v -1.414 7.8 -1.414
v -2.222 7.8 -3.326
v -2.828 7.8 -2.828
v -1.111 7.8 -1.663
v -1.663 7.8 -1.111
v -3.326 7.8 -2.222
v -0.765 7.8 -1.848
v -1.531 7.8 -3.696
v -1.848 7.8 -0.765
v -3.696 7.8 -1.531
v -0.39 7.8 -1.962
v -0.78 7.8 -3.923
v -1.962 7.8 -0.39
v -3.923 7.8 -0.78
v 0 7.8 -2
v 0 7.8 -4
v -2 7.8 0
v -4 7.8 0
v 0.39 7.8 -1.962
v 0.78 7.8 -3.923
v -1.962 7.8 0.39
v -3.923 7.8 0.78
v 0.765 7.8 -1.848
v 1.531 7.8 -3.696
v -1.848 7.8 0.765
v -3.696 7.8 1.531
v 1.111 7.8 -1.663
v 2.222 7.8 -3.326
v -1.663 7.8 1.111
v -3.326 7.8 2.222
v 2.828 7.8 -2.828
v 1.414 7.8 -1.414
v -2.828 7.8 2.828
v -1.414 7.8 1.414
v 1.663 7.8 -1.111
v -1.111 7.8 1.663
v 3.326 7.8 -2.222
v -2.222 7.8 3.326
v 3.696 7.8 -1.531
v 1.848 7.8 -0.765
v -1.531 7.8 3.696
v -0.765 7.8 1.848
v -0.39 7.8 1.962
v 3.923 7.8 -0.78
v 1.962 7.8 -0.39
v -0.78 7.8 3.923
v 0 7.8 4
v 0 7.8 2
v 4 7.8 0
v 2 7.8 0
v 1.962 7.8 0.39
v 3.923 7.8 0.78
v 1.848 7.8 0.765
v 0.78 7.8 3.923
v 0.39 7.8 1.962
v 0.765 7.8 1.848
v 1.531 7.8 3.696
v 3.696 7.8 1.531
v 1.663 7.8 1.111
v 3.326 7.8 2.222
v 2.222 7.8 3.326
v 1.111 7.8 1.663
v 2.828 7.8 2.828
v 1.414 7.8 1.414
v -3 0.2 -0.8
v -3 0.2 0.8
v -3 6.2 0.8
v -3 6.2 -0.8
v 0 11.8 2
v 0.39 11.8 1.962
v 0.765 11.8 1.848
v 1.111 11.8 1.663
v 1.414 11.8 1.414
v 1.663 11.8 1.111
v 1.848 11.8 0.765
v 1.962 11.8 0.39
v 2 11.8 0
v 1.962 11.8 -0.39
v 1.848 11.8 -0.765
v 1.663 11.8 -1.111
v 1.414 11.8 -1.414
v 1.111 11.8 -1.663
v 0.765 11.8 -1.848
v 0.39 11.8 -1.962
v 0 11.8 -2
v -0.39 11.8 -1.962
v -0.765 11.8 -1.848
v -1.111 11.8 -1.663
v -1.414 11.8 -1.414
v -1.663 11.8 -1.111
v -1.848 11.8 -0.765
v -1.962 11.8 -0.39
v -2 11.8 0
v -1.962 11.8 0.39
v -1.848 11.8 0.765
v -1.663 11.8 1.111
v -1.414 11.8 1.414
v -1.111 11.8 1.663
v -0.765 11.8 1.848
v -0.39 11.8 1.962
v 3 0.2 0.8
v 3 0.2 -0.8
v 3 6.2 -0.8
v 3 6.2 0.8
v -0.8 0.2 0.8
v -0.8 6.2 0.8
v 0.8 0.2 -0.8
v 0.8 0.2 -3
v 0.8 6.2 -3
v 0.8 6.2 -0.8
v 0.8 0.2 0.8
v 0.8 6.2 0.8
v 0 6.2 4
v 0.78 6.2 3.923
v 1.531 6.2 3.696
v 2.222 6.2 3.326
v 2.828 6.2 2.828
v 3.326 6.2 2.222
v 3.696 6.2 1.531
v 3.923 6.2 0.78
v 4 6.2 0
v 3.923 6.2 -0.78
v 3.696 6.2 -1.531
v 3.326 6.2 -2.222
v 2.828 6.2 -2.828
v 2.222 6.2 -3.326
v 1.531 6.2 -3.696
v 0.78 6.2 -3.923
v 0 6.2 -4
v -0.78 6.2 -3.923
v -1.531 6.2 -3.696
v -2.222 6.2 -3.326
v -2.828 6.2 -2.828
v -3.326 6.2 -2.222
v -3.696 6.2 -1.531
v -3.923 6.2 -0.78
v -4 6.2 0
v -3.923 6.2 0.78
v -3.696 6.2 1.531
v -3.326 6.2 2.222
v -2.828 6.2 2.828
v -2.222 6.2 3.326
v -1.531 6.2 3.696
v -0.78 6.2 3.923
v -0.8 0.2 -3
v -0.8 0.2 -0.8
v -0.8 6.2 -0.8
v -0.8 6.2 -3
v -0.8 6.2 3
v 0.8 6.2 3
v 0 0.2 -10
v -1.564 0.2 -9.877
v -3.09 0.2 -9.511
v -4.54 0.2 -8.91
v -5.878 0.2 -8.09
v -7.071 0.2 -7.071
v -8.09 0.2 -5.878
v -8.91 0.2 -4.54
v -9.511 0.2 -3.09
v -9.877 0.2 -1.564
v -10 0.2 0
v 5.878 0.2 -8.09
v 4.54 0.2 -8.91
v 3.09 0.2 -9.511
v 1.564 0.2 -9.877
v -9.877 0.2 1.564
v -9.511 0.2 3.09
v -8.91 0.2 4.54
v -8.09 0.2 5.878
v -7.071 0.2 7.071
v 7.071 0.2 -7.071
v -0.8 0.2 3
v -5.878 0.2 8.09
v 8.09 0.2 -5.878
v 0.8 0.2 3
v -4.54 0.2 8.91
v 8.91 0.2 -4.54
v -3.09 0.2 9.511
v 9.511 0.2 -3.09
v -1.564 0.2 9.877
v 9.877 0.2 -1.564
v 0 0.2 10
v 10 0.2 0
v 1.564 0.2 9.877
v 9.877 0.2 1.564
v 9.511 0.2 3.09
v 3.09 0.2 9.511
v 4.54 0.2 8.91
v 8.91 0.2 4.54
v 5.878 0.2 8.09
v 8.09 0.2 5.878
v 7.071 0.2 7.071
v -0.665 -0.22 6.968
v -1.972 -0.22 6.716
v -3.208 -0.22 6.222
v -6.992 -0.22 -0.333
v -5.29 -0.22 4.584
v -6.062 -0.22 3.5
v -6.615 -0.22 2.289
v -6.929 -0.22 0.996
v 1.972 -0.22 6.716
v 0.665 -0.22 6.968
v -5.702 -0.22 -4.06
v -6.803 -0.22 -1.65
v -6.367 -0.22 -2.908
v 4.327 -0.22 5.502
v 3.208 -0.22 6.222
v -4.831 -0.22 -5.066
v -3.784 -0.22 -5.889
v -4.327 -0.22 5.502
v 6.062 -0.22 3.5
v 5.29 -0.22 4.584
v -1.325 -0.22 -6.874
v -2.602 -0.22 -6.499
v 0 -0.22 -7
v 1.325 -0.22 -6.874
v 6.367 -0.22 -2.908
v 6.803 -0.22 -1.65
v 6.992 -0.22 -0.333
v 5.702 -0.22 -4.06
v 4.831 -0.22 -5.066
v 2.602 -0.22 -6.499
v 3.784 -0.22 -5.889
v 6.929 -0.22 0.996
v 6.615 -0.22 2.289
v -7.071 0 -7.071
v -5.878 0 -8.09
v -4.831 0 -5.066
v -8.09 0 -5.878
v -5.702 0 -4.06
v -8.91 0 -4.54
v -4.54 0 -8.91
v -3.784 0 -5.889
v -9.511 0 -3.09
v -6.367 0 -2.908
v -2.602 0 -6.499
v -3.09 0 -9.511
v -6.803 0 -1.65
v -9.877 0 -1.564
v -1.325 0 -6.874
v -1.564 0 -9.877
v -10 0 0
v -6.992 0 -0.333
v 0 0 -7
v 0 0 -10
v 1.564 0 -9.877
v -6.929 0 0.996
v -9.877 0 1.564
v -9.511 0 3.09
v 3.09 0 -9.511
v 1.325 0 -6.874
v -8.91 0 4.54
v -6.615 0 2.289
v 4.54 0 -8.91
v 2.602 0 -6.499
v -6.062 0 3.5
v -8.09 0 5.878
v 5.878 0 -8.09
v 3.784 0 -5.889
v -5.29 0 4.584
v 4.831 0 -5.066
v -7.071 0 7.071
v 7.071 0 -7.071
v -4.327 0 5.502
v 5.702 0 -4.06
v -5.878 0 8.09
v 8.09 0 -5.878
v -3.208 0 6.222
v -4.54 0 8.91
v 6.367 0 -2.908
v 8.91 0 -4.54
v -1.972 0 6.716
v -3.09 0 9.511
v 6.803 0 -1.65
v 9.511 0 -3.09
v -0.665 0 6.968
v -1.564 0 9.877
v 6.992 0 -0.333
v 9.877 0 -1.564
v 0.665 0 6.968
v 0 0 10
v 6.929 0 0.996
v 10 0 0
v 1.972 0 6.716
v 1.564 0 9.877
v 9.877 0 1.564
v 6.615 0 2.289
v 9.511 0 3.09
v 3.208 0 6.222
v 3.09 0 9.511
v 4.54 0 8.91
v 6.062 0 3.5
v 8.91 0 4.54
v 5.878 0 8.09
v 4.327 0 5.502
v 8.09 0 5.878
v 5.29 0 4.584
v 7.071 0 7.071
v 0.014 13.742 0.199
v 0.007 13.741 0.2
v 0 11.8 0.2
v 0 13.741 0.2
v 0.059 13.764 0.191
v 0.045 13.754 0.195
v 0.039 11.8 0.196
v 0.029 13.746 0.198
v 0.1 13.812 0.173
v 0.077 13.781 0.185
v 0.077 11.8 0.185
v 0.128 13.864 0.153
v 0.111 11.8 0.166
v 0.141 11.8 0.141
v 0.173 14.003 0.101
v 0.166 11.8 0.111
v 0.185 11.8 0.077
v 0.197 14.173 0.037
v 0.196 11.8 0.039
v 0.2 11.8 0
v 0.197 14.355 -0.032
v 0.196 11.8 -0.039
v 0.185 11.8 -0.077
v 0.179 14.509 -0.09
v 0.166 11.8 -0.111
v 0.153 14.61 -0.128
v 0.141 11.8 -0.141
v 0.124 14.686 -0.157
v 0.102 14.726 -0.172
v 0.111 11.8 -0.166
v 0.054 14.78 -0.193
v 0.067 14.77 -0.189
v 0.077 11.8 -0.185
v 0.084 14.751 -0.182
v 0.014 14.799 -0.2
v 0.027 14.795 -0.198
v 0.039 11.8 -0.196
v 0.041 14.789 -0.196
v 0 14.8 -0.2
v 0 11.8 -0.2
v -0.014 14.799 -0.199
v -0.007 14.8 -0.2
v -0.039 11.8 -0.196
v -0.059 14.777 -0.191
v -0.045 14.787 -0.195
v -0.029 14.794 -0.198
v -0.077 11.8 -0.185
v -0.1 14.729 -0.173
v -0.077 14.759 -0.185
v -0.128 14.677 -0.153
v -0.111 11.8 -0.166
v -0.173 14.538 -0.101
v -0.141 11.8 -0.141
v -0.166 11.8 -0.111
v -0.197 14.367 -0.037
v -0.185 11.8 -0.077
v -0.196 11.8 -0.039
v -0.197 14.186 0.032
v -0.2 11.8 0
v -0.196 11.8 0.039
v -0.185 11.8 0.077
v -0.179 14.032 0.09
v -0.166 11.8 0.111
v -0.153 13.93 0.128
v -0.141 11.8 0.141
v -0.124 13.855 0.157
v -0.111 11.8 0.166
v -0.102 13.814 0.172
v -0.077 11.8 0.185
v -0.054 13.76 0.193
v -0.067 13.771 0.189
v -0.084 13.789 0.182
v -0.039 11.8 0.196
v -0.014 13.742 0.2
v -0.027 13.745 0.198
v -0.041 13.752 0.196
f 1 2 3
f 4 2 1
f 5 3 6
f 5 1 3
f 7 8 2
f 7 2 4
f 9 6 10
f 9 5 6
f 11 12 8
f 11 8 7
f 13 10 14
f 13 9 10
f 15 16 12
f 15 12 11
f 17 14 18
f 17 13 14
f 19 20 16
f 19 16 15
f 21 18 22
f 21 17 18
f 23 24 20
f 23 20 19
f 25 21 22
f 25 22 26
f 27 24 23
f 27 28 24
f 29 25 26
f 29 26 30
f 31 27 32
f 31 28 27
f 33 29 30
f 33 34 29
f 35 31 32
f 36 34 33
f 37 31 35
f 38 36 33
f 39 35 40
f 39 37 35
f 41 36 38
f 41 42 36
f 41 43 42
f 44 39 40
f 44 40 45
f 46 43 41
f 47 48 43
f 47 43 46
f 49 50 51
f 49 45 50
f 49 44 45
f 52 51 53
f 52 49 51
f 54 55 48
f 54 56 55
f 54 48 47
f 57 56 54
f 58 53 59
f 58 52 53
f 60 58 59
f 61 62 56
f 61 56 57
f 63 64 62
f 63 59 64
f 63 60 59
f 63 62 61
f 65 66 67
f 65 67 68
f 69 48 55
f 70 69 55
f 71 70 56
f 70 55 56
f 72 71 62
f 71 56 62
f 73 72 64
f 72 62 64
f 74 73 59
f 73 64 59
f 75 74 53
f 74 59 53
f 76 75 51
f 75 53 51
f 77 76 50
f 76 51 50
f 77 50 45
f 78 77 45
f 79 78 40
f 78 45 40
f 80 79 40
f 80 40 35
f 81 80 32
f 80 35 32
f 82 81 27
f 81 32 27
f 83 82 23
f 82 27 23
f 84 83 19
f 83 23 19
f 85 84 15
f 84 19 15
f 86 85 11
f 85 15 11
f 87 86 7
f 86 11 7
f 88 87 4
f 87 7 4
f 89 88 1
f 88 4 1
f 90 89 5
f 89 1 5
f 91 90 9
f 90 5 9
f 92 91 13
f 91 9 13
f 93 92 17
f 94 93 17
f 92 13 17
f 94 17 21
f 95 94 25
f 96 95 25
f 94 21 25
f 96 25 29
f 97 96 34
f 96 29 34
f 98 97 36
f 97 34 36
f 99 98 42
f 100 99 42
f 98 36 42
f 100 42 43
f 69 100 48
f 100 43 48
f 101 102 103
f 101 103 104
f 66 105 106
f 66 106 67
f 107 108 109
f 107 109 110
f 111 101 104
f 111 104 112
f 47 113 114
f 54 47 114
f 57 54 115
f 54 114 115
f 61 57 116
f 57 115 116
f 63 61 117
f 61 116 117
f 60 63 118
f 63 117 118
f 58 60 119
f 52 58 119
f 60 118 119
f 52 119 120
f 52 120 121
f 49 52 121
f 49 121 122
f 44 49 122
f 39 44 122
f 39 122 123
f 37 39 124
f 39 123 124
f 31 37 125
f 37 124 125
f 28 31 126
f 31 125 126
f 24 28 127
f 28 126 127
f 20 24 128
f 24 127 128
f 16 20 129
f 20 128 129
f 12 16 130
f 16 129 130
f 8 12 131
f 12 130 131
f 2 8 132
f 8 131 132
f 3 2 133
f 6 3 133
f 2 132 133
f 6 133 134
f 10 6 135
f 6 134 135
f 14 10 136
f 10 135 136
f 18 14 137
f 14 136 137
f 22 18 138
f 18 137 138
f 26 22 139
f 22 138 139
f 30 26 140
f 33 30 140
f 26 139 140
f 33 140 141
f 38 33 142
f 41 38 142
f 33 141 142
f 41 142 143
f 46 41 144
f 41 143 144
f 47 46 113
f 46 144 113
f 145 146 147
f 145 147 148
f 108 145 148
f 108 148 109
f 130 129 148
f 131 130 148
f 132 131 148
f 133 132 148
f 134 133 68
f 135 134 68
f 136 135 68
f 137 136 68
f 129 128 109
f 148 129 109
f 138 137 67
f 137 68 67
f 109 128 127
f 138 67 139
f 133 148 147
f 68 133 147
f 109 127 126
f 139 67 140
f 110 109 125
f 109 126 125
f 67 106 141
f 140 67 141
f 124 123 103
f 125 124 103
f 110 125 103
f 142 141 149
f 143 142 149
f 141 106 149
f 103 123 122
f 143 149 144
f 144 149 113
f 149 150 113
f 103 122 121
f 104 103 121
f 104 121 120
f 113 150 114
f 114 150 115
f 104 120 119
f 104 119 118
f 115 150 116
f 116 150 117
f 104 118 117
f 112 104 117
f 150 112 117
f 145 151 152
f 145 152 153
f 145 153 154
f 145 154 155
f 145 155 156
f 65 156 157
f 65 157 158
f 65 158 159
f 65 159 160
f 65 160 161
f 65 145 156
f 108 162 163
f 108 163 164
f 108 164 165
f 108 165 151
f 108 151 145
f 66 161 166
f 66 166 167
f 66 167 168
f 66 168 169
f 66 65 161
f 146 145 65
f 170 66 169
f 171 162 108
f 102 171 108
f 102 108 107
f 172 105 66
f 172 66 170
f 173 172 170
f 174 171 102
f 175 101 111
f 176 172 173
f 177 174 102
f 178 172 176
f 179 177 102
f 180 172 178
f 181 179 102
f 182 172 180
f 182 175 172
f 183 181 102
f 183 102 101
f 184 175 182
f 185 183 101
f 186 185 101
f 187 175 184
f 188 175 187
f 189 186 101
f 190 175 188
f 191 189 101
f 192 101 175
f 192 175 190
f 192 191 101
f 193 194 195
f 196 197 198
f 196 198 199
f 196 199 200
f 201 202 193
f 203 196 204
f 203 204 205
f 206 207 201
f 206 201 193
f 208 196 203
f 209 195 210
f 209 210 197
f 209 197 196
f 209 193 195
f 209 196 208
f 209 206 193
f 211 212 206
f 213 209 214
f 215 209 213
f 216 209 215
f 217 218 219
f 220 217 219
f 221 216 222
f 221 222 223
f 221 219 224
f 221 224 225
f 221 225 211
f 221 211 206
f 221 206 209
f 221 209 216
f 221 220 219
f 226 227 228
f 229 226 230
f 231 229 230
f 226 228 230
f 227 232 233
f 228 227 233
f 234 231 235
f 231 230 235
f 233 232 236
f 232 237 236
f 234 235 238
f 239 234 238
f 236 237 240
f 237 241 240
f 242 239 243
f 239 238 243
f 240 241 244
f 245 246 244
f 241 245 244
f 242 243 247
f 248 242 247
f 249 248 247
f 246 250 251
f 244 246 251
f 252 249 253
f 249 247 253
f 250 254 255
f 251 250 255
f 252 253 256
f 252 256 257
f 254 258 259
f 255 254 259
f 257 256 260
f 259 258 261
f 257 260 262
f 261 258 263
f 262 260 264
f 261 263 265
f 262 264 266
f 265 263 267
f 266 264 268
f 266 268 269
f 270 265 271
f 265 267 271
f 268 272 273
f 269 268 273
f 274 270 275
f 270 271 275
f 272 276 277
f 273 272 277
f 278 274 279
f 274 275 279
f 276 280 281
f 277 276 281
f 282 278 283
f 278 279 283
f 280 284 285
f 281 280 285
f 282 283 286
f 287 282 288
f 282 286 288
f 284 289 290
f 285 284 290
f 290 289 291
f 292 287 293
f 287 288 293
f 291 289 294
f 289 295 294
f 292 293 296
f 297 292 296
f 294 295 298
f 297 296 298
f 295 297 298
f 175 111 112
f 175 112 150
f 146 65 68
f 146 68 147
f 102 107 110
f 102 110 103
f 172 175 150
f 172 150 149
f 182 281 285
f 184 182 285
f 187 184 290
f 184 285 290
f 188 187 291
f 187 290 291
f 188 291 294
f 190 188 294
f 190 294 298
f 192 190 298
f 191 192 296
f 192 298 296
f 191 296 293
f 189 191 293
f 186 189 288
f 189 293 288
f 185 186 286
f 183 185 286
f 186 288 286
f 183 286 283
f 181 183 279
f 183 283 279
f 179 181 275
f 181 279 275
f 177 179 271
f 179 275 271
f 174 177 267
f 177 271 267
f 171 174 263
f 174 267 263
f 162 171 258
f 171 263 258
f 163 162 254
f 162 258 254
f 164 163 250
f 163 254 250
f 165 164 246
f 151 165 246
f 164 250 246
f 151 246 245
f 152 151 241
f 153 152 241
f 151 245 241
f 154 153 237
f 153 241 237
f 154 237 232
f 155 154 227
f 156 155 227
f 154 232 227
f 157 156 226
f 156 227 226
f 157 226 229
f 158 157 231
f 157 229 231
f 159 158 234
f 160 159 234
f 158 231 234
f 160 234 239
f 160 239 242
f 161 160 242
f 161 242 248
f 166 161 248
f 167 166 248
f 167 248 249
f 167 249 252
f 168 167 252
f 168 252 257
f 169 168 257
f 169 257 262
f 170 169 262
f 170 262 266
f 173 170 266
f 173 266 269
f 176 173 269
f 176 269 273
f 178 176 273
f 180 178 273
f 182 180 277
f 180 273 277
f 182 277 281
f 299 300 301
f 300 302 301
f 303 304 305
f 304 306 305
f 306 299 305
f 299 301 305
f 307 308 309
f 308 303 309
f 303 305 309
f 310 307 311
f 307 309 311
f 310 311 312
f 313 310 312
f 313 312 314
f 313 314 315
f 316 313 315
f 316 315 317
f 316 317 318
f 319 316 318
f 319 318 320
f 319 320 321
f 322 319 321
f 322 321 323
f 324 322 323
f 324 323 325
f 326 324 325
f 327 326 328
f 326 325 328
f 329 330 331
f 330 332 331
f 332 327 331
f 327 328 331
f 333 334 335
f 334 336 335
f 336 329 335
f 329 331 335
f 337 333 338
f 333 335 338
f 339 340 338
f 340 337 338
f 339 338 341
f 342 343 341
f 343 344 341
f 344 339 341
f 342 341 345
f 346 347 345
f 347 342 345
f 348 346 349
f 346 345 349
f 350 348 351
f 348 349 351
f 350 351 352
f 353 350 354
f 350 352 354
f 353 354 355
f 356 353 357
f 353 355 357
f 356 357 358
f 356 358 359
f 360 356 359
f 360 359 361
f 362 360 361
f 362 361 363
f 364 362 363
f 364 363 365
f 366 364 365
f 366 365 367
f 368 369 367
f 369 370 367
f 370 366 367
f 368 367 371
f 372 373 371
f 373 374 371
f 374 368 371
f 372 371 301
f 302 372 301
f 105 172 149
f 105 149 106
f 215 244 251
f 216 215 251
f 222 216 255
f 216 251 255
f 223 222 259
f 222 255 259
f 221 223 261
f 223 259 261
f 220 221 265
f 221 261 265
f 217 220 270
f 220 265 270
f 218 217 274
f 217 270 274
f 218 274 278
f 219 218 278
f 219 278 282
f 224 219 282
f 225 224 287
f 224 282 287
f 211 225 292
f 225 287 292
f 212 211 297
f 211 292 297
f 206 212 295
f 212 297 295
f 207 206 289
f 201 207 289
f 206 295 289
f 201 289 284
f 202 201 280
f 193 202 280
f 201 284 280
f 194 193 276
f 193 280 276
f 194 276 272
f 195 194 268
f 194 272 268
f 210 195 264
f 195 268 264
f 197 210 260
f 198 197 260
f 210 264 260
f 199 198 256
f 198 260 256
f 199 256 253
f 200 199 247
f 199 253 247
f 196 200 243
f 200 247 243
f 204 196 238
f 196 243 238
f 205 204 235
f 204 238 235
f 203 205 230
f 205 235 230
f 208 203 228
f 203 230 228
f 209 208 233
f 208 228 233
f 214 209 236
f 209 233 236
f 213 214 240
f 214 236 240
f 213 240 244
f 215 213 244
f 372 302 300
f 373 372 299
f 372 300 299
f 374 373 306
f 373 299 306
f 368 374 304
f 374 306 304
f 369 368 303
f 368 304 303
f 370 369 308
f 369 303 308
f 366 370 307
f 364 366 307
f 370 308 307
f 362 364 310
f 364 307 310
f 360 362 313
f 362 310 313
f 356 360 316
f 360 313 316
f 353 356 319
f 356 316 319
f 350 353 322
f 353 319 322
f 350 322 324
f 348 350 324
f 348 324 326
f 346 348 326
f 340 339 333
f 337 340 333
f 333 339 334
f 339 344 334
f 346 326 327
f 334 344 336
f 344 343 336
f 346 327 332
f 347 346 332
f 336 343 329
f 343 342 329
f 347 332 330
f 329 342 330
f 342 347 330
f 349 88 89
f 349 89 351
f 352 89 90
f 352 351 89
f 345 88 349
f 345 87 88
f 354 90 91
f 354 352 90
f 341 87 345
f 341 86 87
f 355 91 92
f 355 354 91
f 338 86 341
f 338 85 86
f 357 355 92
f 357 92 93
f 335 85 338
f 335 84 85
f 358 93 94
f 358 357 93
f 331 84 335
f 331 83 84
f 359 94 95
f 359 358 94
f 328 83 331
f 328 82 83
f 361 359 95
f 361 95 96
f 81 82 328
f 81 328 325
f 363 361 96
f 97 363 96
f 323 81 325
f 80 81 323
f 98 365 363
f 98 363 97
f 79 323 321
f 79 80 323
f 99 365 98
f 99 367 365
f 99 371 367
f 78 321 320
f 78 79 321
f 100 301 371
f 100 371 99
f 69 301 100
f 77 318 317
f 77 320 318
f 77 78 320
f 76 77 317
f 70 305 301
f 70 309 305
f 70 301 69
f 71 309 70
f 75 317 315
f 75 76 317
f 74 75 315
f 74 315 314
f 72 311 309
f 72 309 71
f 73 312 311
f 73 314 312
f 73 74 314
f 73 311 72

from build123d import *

# Parameters (mm, degrees)
SKETCH_1_R          = 10
EXTRUDE_1_DEPTH     = 0.2
EXTRUDE_2_DEPTH     = 6
SKETCH_3_R          = 4
EXTRUDE_3_DEPTH     = 1.6
SKETCH_4_R          = 7
EXTRUDE_4_DEPTH     = 0.22
SKETCH_5_R          = 2
EXTRUDE_5_DEPTH     = 4
SKETCH_6_R          = 0.2
EXTRUDE_6_DEPTH     = 3
CUT_EXTRUDE_1_DEPTH = 1.5


with BuildPart() as part:
    # 草图1 → 凸台-拉伸1 (new body)
    with BuildSketch(Plane(origin=(0, 0, 0), x_dir=(1, 0, 0), z_dir=(0, 1, 0))):
        with Locations(Location((0, 0, 0), (0, 0, 270))):
            Circle(SKETCH_1_R)
    extrude(amount=EXTRUDE_1_DEPTH)

    # 草图2 → 凸台-拉伸2 (add)
    with BuildSketch(Plane(origin=(0, 0.2, 0), x_dir=(1, 0, 0), z_dir=(0, 1, 0))):
        Polygon((-0.8, 3), (0.8, 3), (0.8, 0.8), (3, 0.8), (3, -0.8), (0.8, -0.8), (0.8, -3), (-0.8, -3), (-0.8, -0.8), (-3, -0.8), (-3, 0.8), (-0.8, 0.8), align=None)
    extrude(amount=EXTRUDE_2_DEPTH)

    # 草图3 → 凸台-拉伸3 (add)
    with BuildSketch(Plane(origin=(0, 6.2, 0), x_dir=(1, 0, 0), z_dir=(0, 1, 0))):
        with Locations(Location((0, 0, 0), (0, 0, 270))):
            Circle(SKETCH_3_R)
    extrude(amount=EXTRUDE_3_DEPTH)

    # 草图4 → 凸台-拉伸4 (add)
    with BuildSketch(Plane(origin=(0, 0, 0), x_dir=(-1, 0, 0), z_dir=(0, -1, 0))):
        with Locations(Location((0, 0, 0), (0, 0, 90))):
            Circle(SKETCH_4_R)
    extrude(amount=EXTRUDE_4_DEPTH)

    # 草图5 → 凸台-拉伸5 (add)
    with BuildSketch(Plane(origin=(0, 7.8, 0), x_dir=(1, 0, 0), z_dir=(0, 1, 0))):
        with Locations(Location((0, 0, 0), (0, 0, 270))):
            Circle(SKETCH_5_R)
    extrude(amount=EXTRUDE_5_DEPTH)

    # 草图6 → 凸台-拉伸6 (add)
    with BuildSketch(Plane(origin=(0, 11.8, 0), x_dir=(1, 0, 0), z_dir=(0, 1, 0))):
        with Locations(Location((0, 0, 0), (0, 0, 270))):
            Circle(SKETCH_6_R)
    extrude(amount=EXTRUDE_6_DEPTH)

    # 草图7 → 切除-拉伸1 (cut, symmetric)
    with BuildSketch(Plane(origin=(0, 0, 0), x_dir=(0, 0, -1), z_dir=(1, 0, 0))):
        Polygon((0.2, 14.8), (-0.2, 14.8), (-0.2, 13.740589274), align=None)
    extrude(amount=CUT_EXTRUDE_1_DEPTH, both=True, mode=Mode.SUBTRACT)


solid = part.part
